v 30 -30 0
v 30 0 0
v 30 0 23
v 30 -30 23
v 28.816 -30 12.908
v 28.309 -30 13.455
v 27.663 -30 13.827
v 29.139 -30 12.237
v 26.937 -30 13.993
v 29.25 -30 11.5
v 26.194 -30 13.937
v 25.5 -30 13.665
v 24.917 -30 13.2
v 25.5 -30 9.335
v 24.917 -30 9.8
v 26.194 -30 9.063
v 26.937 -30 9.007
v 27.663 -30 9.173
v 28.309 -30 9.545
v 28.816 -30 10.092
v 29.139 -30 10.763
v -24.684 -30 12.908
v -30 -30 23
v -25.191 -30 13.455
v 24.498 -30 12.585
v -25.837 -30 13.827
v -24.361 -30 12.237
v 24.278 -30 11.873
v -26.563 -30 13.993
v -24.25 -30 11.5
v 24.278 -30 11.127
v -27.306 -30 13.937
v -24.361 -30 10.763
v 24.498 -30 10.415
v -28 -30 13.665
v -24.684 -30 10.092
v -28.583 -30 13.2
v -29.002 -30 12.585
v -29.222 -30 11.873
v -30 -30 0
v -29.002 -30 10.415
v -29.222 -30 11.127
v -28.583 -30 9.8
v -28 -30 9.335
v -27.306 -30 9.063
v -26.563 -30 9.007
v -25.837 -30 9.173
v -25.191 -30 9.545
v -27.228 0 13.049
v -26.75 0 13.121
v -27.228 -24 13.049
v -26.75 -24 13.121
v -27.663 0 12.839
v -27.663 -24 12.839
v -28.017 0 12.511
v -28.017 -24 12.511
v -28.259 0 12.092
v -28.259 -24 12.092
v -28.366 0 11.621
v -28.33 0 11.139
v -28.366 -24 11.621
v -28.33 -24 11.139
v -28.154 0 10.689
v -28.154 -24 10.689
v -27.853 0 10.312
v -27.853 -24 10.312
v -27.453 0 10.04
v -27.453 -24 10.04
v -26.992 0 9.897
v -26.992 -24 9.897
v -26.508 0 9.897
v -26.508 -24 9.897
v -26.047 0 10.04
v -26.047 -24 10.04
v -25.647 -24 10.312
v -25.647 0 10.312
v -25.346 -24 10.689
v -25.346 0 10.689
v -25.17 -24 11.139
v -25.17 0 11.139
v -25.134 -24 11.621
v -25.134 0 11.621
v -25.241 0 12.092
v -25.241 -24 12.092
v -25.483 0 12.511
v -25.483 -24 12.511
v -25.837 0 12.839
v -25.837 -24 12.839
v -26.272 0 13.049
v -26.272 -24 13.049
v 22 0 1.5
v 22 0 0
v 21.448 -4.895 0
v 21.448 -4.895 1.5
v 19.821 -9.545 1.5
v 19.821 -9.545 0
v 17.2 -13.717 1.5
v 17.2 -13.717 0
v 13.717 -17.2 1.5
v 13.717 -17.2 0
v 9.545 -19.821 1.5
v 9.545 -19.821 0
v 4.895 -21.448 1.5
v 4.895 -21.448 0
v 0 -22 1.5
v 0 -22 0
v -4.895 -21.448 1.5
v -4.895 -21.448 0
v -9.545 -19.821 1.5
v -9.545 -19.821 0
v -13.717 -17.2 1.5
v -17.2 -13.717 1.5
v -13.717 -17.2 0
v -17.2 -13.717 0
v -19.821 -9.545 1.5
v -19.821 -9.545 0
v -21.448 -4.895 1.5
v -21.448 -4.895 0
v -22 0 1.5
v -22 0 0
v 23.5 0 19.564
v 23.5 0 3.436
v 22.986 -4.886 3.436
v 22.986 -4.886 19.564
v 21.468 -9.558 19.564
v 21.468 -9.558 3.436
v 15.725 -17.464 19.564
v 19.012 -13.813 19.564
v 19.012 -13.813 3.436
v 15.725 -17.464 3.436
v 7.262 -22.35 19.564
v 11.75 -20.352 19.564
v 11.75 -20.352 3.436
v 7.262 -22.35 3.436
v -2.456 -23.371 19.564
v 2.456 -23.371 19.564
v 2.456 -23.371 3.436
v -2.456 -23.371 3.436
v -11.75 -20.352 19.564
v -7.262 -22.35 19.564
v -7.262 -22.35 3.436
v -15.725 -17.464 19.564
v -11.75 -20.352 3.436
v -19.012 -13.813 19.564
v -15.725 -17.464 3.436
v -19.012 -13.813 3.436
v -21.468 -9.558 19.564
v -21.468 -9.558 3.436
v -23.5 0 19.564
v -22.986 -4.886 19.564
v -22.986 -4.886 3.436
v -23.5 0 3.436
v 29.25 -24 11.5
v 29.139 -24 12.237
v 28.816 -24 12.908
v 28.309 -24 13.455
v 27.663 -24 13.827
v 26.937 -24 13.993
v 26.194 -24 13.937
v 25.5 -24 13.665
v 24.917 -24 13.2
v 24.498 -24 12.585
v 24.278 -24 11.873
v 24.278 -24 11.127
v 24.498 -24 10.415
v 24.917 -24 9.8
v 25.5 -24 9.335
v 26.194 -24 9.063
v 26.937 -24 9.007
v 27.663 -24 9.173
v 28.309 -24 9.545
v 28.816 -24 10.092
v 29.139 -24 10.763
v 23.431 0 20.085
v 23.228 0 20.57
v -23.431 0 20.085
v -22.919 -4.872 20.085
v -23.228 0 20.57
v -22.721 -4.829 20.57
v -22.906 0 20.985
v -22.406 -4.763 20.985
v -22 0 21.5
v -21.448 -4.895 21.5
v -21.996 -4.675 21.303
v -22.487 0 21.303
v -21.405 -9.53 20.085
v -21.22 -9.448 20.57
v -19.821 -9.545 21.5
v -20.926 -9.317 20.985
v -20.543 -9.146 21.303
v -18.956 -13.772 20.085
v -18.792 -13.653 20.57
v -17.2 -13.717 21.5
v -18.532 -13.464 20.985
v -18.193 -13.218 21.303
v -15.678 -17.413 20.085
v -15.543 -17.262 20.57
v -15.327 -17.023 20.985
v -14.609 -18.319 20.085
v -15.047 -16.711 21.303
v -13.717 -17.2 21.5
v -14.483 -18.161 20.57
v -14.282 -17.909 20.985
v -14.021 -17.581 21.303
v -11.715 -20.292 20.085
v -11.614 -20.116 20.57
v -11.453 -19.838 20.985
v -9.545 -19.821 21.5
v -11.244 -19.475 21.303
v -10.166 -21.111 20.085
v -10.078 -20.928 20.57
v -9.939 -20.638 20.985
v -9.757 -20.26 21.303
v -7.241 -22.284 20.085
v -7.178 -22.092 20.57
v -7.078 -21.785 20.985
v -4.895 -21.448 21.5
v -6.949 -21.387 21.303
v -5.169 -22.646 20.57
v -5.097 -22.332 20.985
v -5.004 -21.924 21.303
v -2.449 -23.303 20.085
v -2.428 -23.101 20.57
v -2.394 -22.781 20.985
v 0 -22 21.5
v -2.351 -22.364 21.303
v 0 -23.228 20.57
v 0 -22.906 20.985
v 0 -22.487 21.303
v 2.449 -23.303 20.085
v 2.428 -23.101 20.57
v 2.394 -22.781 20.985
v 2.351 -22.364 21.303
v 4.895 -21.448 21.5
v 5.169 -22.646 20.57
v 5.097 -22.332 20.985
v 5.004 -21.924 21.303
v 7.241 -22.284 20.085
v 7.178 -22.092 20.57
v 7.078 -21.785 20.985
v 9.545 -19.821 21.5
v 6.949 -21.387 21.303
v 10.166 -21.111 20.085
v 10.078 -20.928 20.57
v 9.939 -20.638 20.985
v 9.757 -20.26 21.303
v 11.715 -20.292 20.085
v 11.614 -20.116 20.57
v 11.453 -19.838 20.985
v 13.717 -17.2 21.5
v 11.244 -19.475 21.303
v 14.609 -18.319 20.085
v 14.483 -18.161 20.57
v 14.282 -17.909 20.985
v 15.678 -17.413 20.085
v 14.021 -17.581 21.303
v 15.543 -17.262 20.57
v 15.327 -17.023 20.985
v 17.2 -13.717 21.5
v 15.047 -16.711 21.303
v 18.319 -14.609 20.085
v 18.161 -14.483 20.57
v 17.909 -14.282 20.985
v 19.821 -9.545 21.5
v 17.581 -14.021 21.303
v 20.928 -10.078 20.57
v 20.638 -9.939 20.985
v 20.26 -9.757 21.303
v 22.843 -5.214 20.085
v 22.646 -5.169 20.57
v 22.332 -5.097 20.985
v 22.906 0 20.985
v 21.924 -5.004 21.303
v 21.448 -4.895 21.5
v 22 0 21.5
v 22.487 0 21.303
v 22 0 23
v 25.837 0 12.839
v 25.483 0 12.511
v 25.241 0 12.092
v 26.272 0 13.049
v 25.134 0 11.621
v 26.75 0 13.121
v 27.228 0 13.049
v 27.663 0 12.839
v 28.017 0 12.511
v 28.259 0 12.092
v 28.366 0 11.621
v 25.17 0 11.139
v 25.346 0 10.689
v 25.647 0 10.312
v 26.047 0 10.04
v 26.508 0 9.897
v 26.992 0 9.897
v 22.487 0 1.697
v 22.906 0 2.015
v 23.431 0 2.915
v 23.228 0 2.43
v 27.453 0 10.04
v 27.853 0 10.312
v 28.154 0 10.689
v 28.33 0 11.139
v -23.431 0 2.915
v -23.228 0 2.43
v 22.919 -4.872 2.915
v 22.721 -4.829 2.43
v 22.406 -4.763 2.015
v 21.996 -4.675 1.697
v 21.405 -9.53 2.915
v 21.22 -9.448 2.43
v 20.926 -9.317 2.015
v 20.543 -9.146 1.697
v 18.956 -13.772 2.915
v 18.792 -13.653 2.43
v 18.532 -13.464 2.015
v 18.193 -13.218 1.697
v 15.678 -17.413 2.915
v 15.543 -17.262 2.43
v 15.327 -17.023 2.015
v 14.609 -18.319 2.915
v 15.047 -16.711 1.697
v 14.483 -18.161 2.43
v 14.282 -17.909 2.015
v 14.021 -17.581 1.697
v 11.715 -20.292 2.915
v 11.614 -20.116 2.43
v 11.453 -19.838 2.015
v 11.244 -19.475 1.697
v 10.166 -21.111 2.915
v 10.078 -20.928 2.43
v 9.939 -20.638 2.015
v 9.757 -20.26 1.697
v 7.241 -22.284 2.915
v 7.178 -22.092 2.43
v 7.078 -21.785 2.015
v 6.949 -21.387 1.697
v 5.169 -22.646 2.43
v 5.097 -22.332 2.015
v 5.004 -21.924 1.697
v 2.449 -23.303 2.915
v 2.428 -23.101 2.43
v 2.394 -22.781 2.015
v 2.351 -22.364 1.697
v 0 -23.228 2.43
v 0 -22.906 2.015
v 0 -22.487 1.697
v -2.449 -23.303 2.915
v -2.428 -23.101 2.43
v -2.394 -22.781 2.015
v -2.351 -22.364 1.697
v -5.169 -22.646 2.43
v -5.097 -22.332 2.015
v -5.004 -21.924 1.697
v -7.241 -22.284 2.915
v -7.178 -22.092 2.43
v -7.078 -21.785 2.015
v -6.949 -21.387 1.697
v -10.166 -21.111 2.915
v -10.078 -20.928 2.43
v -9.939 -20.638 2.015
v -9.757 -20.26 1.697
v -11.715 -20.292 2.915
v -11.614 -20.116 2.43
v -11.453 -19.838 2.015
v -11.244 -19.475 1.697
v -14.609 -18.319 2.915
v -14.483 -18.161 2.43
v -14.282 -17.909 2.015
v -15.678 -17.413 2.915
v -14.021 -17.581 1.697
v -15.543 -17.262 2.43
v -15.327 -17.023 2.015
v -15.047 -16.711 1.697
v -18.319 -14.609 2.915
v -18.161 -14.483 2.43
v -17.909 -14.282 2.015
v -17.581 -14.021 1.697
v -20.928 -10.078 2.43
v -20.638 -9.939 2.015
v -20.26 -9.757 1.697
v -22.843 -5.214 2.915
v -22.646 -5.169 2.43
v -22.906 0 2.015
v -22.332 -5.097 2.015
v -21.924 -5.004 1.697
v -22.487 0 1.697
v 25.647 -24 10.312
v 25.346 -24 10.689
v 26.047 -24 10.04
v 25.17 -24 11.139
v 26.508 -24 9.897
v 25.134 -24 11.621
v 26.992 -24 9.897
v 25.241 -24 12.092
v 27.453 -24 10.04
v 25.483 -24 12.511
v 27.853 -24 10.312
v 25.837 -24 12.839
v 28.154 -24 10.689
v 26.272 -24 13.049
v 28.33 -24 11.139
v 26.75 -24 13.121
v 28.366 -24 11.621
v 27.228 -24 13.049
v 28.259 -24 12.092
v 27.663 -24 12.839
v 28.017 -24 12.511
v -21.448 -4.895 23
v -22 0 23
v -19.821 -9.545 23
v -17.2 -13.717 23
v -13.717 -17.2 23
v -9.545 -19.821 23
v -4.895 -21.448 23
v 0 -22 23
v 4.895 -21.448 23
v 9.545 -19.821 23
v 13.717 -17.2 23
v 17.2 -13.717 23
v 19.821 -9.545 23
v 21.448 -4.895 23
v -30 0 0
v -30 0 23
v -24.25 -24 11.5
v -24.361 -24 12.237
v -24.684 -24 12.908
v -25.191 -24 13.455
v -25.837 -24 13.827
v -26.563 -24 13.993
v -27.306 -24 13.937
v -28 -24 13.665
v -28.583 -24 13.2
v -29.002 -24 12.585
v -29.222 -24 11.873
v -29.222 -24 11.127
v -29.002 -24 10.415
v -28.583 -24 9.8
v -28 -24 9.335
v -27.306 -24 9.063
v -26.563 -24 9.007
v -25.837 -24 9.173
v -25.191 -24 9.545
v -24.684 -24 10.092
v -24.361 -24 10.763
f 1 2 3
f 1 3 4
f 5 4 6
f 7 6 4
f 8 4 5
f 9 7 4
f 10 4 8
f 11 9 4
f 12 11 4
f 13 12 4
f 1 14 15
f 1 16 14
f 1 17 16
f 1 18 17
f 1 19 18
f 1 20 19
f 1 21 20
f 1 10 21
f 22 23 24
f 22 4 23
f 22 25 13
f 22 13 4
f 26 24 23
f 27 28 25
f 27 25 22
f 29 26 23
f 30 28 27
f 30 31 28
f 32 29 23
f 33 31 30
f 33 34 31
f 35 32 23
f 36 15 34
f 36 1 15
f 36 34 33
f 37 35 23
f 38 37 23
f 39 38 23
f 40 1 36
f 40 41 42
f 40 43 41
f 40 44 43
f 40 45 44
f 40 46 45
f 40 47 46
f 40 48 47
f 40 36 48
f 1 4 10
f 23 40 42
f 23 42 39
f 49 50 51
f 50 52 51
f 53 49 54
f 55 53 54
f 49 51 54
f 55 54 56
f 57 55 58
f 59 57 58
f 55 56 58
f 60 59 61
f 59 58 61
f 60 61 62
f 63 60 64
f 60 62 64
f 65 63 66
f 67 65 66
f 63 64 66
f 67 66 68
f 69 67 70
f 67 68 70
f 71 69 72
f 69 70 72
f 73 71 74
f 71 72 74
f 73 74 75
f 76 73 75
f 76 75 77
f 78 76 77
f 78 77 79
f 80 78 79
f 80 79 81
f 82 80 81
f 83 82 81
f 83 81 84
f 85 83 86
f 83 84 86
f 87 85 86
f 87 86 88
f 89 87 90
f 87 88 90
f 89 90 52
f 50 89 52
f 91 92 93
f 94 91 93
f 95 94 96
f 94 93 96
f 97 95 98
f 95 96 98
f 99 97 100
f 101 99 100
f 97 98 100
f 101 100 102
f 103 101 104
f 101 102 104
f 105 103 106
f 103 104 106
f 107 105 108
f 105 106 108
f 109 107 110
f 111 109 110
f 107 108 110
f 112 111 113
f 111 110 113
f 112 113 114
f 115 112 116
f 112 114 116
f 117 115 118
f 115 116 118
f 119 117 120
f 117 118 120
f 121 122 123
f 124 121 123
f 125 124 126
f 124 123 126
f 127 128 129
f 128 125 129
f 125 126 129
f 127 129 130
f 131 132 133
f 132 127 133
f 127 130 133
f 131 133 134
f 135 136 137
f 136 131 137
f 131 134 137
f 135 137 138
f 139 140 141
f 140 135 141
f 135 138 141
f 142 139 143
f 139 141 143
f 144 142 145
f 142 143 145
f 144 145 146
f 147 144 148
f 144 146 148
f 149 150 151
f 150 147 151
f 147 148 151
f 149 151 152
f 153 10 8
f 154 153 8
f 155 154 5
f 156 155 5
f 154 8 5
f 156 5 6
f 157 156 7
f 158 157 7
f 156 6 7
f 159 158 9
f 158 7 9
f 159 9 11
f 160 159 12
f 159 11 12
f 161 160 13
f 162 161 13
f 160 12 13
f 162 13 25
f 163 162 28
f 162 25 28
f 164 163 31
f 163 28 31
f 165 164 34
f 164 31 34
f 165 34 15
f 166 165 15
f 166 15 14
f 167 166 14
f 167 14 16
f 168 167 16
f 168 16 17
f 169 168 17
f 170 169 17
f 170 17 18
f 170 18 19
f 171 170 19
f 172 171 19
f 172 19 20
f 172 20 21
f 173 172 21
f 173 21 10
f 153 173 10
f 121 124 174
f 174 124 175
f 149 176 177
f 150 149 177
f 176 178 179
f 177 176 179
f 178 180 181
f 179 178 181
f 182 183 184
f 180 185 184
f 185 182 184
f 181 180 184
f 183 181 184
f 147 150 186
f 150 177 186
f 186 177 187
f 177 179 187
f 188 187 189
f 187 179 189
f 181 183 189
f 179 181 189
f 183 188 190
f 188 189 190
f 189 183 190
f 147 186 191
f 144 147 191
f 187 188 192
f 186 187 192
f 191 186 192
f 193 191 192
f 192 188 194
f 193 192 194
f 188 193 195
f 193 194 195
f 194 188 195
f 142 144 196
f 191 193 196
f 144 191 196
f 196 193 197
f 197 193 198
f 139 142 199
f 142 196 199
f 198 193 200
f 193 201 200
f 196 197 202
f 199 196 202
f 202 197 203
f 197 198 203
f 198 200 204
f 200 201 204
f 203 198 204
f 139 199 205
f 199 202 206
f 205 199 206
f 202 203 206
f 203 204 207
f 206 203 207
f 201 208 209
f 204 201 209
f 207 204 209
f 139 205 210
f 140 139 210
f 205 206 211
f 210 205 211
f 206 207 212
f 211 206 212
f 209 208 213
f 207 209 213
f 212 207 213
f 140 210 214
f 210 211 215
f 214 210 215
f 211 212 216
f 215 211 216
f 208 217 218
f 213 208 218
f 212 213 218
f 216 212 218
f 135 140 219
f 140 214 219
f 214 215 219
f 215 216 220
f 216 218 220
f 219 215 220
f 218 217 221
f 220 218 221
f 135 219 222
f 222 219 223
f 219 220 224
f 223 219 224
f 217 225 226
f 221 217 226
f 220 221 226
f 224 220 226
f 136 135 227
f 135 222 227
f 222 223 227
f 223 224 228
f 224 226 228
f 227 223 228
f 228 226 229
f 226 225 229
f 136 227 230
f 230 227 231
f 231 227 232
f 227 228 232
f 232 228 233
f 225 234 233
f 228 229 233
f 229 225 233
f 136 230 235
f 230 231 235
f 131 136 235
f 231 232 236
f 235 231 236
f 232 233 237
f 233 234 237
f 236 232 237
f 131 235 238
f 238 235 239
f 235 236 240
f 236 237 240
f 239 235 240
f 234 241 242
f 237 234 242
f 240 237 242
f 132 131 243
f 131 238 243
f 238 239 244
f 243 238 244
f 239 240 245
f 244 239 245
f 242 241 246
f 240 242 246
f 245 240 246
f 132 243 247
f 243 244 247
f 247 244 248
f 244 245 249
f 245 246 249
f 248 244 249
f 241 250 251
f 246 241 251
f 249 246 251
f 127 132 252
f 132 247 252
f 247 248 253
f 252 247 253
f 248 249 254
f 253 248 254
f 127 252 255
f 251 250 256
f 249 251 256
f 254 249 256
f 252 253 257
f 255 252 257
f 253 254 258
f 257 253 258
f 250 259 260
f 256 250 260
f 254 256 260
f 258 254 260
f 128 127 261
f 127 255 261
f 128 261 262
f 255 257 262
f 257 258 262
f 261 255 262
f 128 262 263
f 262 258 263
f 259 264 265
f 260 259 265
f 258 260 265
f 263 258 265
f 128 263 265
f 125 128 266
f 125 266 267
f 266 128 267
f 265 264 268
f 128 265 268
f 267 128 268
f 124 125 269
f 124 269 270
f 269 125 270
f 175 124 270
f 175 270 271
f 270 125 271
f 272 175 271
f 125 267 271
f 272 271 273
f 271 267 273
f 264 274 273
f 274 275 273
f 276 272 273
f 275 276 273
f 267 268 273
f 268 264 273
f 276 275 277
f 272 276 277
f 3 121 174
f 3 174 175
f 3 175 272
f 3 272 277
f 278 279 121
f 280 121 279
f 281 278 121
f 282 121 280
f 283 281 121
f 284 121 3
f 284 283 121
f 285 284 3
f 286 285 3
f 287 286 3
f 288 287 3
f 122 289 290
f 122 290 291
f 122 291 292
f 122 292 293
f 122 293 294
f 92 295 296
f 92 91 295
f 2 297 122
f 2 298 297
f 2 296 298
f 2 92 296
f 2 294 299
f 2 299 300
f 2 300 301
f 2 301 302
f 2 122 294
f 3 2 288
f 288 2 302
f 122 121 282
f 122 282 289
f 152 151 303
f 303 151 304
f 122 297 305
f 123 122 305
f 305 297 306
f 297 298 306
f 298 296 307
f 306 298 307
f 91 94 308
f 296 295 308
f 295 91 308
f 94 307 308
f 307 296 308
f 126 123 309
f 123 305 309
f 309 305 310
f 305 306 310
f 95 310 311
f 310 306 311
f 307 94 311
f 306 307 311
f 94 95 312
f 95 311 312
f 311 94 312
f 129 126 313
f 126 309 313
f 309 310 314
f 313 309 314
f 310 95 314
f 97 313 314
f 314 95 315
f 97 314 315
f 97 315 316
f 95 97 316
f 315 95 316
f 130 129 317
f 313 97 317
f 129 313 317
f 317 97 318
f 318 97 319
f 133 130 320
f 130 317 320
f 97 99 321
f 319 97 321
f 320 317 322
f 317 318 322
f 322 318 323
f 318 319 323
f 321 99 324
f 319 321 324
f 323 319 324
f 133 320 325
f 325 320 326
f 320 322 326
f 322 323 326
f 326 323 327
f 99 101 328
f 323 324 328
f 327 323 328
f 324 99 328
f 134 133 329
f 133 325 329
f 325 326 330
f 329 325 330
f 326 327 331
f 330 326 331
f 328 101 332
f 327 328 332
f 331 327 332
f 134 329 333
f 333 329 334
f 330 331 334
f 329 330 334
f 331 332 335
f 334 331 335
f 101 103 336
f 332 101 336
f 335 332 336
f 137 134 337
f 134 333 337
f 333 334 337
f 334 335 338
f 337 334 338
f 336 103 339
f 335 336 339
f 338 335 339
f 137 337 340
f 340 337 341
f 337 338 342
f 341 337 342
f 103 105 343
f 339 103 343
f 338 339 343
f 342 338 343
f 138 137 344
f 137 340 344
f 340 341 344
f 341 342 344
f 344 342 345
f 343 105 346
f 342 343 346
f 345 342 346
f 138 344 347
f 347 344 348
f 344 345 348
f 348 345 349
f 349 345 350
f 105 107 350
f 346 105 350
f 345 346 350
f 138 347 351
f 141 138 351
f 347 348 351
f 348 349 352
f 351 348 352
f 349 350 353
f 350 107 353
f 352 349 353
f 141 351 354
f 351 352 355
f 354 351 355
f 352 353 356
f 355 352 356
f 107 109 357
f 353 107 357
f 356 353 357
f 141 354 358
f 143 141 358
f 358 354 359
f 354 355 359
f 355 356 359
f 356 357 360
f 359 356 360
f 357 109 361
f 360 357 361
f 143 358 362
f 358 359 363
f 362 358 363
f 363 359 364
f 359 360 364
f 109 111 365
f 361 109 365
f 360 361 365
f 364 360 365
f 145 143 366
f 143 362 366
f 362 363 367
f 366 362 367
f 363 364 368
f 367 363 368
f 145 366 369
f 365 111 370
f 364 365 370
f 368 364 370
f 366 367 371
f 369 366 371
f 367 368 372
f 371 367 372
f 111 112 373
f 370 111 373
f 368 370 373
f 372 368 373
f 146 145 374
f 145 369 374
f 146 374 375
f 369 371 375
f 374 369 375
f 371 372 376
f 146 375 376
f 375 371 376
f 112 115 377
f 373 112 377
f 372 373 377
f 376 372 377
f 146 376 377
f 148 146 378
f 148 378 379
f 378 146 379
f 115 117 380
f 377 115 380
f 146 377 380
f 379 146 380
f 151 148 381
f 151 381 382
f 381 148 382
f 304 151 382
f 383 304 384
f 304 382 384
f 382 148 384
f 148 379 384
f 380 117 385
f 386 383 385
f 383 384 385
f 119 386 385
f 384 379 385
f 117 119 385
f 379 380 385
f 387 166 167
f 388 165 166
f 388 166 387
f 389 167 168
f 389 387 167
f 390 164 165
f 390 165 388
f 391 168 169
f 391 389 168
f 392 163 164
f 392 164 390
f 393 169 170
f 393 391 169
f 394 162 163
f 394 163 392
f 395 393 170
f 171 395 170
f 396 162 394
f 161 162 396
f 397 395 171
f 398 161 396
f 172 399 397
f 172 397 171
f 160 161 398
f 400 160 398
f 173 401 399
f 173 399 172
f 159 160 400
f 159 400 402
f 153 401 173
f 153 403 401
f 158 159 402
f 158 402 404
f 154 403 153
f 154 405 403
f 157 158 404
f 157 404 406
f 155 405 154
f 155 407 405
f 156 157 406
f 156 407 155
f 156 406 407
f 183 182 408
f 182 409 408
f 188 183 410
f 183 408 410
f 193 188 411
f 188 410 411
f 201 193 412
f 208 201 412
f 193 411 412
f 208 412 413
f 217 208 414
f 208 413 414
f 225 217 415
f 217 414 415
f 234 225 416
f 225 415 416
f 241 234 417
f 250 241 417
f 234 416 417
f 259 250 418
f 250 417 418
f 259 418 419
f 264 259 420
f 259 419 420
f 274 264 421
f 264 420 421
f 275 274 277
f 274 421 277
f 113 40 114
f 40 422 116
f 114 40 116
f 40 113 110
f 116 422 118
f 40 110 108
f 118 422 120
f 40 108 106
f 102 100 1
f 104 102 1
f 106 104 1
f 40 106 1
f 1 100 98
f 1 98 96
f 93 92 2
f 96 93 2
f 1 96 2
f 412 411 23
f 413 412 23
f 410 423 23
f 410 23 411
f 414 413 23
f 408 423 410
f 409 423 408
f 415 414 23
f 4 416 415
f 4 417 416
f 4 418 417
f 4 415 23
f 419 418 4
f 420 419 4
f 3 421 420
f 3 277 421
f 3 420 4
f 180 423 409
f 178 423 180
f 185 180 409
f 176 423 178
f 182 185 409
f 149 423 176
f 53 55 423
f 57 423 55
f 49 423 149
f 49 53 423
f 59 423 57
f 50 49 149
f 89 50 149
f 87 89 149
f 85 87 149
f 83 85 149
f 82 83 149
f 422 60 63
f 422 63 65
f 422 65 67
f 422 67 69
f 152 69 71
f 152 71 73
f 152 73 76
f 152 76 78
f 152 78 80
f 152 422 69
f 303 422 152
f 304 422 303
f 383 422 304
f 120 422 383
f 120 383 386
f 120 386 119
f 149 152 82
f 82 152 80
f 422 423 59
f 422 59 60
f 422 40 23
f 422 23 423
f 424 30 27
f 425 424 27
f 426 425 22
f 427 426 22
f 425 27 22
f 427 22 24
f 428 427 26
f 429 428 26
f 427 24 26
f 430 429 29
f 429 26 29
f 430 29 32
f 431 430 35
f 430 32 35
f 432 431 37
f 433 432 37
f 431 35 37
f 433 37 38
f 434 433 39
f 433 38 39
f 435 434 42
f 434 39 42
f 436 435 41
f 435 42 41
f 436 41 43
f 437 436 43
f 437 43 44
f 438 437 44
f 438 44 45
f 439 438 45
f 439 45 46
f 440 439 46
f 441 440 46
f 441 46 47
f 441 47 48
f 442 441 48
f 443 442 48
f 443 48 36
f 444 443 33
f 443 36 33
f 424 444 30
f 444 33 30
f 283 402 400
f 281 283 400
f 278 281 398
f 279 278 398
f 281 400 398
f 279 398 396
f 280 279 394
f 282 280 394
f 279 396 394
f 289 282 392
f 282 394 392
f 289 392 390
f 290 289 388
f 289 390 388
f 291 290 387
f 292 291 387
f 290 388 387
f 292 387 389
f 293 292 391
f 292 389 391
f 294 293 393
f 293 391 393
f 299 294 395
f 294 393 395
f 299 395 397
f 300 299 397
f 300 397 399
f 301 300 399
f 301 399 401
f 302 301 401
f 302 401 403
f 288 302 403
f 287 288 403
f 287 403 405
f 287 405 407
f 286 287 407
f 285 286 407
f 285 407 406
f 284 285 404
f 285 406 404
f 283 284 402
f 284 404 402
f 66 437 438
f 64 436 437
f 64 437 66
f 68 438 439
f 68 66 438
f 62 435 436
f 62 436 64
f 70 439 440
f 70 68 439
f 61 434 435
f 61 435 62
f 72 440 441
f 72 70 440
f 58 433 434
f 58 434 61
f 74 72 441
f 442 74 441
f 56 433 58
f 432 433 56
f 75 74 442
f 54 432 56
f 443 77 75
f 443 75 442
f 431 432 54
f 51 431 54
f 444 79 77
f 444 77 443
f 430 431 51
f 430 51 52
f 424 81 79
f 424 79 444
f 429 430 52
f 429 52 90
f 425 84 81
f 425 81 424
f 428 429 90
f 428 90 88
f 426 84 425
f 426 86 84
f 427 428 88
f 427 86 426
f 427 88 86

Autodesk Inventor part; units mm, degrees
ref_plane "YZ Plane" through (0, 0, 0) normal (1, 0, 0) x (0, 1, 0)
ref_plane "XZ Plane" through (0, 0, 0) normal (0, 1, 0) x (-1, 0, 0)
ref_plane "XY Plane" through (0, 0, 0) normal (0, 0, 1) x (1, 0, 0)
sketch "Sketch1" plane through (0, 0, 0) normal (0, 0, 1) x (1, 0, 0)
  arc A0 (-23.5, 0) -> (23.5, 0) centre (0, 0) ccw
  line L0 (30, 0) -> (30, -30)
  line L1 (30, -30) -> (-30, -30)
  line L2 (-30, -30) -> (-30, 0)
  line L3 (-30, 0) -> (-23.5, 0)
  line L4 (23.5, 0) -> (30, 0)
  dimension "d0" = 47
  dimension "d1" = 30
  dimension "d3" = 60
  dimension "d4" = 30
extrude "Extrusion1" add sketch "Sketch1" along normal blind 23
ref_plane "Work Plane1" through (0, 0, 23) normal (0, 0, 1) x (1, 0, 0)
sketch "Sketch2" plane through (0, 0, 23) normal (0, 0, 1) x (1, 0, 0)
  line L0 (30, 0) -> (23.5, 0) projected
  arc A0 (-23.5, 0) -> (23.5, 0) centre (0, 0) ccw
  arc A1 (-22, 0) -> (22, 0) centre (0, 0) ccw
  line L1 (-23.5, 0) -> (-22, 0)
  line L2 (22, 0) -> (23.5, 0)
  dimension "d8" = 44
extrude "Extrusion2" add sketch "Sketch2" against normal blind 1.5
fillet "Fillet1" radius 2 1 edges at (0, -23.5, 21.5)
ref_plane "Work Plane2" through (0, 0, 0) normal (0, 0, -1) x (-1, 0, 0)
sketch "Sketch3" plane through (0, 0, 0) normal (0, 0, -1) x (-1, 0, 0)
  arc A0 (-23.5, 0) -> (23.5, 0) centre (0, 0) ccw
  arc A1 (-22, 0) -> (22, 0) centre (0, 0) ccw
  line L0 (23.5, 0) -> (30, 0) projected
  line L1 (23.5, 0) -> (22, 0)
  line L2 (-22, 0) -> (-23.5, 0)
extrude "Extrusion3" add sketch "Sketch3" against normal blind 1.5
fillet "Fillet2" radius 2 1 edges at (0, -23.5, 1.5)
sketch "Sketch4" plane through (-30, 0, 23) normal (0, 1, 0) x (1, 0, 0)
  line L0 (-12, 23) -> (72, 23) projected
  line L1 (0, 23) -> (0, 0) projected
  line L2 (53.5, 19.5635) -> (53.5, 3.4365) projected
  point P0 (30, 23)
  point P1 (3.25, 11.5)
  point P2 (56.75, 11.5)
  dimension "d16" = 11.5
  dimension "d17" = 3.25
  dimension "d18" = 3.25
hole "Hole1" at (-26.75, 0, 11.5) at (26.75, 0, 11.5) direction (0, -1, 0) diameter 3.242 end through all thread size "M4x0.7" class "6H" standard "ISO Metric profile"
sketch "Sketch5" plane through (-30, -30, 0) normal (0, -1, 0) x (1, 0, 0)
  line L0 (0, 0) -> (0, 23) projected
  line L1 (0, 0) -> (60, 0) projected
  circle A0 centre (3.25, 11.5) radius 2.5
  circle A1 centre (56.75, 11.5) radius 1.621 projected
  circle A2 centre (56.75, 11.5) radius 2.5
  point P0 (30, 0)
  dimension "d26" = 3.25
  dimension "d27" = 11.5
  dimension "d28" = 5
  dimension "d29" = 5
extrude "Extrusion4" cut sketch "Sketch5" against normal blind 6
equation "\"d24\" = Thickness"
equation "\"BendRadius\" = Thickness"
equation "\"BendReliefWidth\" = Thickness"
equation "\"BendReliefDepth\" = 0.5 * Thickness"
equation "\"CornerReliefSize\" = 4 * Thickness"
equation "\"MinimumRemnant\" = 2 * Thickness"
equation "\"TransitionRadius\" = BendRadius"
equation "\"JacobiRadiusSize\" = BendRadius"
equation "\"GapSize\" = Thickness"
equation "\"Thickness\" = 0.5"
properties part number "Bearing housing top"
